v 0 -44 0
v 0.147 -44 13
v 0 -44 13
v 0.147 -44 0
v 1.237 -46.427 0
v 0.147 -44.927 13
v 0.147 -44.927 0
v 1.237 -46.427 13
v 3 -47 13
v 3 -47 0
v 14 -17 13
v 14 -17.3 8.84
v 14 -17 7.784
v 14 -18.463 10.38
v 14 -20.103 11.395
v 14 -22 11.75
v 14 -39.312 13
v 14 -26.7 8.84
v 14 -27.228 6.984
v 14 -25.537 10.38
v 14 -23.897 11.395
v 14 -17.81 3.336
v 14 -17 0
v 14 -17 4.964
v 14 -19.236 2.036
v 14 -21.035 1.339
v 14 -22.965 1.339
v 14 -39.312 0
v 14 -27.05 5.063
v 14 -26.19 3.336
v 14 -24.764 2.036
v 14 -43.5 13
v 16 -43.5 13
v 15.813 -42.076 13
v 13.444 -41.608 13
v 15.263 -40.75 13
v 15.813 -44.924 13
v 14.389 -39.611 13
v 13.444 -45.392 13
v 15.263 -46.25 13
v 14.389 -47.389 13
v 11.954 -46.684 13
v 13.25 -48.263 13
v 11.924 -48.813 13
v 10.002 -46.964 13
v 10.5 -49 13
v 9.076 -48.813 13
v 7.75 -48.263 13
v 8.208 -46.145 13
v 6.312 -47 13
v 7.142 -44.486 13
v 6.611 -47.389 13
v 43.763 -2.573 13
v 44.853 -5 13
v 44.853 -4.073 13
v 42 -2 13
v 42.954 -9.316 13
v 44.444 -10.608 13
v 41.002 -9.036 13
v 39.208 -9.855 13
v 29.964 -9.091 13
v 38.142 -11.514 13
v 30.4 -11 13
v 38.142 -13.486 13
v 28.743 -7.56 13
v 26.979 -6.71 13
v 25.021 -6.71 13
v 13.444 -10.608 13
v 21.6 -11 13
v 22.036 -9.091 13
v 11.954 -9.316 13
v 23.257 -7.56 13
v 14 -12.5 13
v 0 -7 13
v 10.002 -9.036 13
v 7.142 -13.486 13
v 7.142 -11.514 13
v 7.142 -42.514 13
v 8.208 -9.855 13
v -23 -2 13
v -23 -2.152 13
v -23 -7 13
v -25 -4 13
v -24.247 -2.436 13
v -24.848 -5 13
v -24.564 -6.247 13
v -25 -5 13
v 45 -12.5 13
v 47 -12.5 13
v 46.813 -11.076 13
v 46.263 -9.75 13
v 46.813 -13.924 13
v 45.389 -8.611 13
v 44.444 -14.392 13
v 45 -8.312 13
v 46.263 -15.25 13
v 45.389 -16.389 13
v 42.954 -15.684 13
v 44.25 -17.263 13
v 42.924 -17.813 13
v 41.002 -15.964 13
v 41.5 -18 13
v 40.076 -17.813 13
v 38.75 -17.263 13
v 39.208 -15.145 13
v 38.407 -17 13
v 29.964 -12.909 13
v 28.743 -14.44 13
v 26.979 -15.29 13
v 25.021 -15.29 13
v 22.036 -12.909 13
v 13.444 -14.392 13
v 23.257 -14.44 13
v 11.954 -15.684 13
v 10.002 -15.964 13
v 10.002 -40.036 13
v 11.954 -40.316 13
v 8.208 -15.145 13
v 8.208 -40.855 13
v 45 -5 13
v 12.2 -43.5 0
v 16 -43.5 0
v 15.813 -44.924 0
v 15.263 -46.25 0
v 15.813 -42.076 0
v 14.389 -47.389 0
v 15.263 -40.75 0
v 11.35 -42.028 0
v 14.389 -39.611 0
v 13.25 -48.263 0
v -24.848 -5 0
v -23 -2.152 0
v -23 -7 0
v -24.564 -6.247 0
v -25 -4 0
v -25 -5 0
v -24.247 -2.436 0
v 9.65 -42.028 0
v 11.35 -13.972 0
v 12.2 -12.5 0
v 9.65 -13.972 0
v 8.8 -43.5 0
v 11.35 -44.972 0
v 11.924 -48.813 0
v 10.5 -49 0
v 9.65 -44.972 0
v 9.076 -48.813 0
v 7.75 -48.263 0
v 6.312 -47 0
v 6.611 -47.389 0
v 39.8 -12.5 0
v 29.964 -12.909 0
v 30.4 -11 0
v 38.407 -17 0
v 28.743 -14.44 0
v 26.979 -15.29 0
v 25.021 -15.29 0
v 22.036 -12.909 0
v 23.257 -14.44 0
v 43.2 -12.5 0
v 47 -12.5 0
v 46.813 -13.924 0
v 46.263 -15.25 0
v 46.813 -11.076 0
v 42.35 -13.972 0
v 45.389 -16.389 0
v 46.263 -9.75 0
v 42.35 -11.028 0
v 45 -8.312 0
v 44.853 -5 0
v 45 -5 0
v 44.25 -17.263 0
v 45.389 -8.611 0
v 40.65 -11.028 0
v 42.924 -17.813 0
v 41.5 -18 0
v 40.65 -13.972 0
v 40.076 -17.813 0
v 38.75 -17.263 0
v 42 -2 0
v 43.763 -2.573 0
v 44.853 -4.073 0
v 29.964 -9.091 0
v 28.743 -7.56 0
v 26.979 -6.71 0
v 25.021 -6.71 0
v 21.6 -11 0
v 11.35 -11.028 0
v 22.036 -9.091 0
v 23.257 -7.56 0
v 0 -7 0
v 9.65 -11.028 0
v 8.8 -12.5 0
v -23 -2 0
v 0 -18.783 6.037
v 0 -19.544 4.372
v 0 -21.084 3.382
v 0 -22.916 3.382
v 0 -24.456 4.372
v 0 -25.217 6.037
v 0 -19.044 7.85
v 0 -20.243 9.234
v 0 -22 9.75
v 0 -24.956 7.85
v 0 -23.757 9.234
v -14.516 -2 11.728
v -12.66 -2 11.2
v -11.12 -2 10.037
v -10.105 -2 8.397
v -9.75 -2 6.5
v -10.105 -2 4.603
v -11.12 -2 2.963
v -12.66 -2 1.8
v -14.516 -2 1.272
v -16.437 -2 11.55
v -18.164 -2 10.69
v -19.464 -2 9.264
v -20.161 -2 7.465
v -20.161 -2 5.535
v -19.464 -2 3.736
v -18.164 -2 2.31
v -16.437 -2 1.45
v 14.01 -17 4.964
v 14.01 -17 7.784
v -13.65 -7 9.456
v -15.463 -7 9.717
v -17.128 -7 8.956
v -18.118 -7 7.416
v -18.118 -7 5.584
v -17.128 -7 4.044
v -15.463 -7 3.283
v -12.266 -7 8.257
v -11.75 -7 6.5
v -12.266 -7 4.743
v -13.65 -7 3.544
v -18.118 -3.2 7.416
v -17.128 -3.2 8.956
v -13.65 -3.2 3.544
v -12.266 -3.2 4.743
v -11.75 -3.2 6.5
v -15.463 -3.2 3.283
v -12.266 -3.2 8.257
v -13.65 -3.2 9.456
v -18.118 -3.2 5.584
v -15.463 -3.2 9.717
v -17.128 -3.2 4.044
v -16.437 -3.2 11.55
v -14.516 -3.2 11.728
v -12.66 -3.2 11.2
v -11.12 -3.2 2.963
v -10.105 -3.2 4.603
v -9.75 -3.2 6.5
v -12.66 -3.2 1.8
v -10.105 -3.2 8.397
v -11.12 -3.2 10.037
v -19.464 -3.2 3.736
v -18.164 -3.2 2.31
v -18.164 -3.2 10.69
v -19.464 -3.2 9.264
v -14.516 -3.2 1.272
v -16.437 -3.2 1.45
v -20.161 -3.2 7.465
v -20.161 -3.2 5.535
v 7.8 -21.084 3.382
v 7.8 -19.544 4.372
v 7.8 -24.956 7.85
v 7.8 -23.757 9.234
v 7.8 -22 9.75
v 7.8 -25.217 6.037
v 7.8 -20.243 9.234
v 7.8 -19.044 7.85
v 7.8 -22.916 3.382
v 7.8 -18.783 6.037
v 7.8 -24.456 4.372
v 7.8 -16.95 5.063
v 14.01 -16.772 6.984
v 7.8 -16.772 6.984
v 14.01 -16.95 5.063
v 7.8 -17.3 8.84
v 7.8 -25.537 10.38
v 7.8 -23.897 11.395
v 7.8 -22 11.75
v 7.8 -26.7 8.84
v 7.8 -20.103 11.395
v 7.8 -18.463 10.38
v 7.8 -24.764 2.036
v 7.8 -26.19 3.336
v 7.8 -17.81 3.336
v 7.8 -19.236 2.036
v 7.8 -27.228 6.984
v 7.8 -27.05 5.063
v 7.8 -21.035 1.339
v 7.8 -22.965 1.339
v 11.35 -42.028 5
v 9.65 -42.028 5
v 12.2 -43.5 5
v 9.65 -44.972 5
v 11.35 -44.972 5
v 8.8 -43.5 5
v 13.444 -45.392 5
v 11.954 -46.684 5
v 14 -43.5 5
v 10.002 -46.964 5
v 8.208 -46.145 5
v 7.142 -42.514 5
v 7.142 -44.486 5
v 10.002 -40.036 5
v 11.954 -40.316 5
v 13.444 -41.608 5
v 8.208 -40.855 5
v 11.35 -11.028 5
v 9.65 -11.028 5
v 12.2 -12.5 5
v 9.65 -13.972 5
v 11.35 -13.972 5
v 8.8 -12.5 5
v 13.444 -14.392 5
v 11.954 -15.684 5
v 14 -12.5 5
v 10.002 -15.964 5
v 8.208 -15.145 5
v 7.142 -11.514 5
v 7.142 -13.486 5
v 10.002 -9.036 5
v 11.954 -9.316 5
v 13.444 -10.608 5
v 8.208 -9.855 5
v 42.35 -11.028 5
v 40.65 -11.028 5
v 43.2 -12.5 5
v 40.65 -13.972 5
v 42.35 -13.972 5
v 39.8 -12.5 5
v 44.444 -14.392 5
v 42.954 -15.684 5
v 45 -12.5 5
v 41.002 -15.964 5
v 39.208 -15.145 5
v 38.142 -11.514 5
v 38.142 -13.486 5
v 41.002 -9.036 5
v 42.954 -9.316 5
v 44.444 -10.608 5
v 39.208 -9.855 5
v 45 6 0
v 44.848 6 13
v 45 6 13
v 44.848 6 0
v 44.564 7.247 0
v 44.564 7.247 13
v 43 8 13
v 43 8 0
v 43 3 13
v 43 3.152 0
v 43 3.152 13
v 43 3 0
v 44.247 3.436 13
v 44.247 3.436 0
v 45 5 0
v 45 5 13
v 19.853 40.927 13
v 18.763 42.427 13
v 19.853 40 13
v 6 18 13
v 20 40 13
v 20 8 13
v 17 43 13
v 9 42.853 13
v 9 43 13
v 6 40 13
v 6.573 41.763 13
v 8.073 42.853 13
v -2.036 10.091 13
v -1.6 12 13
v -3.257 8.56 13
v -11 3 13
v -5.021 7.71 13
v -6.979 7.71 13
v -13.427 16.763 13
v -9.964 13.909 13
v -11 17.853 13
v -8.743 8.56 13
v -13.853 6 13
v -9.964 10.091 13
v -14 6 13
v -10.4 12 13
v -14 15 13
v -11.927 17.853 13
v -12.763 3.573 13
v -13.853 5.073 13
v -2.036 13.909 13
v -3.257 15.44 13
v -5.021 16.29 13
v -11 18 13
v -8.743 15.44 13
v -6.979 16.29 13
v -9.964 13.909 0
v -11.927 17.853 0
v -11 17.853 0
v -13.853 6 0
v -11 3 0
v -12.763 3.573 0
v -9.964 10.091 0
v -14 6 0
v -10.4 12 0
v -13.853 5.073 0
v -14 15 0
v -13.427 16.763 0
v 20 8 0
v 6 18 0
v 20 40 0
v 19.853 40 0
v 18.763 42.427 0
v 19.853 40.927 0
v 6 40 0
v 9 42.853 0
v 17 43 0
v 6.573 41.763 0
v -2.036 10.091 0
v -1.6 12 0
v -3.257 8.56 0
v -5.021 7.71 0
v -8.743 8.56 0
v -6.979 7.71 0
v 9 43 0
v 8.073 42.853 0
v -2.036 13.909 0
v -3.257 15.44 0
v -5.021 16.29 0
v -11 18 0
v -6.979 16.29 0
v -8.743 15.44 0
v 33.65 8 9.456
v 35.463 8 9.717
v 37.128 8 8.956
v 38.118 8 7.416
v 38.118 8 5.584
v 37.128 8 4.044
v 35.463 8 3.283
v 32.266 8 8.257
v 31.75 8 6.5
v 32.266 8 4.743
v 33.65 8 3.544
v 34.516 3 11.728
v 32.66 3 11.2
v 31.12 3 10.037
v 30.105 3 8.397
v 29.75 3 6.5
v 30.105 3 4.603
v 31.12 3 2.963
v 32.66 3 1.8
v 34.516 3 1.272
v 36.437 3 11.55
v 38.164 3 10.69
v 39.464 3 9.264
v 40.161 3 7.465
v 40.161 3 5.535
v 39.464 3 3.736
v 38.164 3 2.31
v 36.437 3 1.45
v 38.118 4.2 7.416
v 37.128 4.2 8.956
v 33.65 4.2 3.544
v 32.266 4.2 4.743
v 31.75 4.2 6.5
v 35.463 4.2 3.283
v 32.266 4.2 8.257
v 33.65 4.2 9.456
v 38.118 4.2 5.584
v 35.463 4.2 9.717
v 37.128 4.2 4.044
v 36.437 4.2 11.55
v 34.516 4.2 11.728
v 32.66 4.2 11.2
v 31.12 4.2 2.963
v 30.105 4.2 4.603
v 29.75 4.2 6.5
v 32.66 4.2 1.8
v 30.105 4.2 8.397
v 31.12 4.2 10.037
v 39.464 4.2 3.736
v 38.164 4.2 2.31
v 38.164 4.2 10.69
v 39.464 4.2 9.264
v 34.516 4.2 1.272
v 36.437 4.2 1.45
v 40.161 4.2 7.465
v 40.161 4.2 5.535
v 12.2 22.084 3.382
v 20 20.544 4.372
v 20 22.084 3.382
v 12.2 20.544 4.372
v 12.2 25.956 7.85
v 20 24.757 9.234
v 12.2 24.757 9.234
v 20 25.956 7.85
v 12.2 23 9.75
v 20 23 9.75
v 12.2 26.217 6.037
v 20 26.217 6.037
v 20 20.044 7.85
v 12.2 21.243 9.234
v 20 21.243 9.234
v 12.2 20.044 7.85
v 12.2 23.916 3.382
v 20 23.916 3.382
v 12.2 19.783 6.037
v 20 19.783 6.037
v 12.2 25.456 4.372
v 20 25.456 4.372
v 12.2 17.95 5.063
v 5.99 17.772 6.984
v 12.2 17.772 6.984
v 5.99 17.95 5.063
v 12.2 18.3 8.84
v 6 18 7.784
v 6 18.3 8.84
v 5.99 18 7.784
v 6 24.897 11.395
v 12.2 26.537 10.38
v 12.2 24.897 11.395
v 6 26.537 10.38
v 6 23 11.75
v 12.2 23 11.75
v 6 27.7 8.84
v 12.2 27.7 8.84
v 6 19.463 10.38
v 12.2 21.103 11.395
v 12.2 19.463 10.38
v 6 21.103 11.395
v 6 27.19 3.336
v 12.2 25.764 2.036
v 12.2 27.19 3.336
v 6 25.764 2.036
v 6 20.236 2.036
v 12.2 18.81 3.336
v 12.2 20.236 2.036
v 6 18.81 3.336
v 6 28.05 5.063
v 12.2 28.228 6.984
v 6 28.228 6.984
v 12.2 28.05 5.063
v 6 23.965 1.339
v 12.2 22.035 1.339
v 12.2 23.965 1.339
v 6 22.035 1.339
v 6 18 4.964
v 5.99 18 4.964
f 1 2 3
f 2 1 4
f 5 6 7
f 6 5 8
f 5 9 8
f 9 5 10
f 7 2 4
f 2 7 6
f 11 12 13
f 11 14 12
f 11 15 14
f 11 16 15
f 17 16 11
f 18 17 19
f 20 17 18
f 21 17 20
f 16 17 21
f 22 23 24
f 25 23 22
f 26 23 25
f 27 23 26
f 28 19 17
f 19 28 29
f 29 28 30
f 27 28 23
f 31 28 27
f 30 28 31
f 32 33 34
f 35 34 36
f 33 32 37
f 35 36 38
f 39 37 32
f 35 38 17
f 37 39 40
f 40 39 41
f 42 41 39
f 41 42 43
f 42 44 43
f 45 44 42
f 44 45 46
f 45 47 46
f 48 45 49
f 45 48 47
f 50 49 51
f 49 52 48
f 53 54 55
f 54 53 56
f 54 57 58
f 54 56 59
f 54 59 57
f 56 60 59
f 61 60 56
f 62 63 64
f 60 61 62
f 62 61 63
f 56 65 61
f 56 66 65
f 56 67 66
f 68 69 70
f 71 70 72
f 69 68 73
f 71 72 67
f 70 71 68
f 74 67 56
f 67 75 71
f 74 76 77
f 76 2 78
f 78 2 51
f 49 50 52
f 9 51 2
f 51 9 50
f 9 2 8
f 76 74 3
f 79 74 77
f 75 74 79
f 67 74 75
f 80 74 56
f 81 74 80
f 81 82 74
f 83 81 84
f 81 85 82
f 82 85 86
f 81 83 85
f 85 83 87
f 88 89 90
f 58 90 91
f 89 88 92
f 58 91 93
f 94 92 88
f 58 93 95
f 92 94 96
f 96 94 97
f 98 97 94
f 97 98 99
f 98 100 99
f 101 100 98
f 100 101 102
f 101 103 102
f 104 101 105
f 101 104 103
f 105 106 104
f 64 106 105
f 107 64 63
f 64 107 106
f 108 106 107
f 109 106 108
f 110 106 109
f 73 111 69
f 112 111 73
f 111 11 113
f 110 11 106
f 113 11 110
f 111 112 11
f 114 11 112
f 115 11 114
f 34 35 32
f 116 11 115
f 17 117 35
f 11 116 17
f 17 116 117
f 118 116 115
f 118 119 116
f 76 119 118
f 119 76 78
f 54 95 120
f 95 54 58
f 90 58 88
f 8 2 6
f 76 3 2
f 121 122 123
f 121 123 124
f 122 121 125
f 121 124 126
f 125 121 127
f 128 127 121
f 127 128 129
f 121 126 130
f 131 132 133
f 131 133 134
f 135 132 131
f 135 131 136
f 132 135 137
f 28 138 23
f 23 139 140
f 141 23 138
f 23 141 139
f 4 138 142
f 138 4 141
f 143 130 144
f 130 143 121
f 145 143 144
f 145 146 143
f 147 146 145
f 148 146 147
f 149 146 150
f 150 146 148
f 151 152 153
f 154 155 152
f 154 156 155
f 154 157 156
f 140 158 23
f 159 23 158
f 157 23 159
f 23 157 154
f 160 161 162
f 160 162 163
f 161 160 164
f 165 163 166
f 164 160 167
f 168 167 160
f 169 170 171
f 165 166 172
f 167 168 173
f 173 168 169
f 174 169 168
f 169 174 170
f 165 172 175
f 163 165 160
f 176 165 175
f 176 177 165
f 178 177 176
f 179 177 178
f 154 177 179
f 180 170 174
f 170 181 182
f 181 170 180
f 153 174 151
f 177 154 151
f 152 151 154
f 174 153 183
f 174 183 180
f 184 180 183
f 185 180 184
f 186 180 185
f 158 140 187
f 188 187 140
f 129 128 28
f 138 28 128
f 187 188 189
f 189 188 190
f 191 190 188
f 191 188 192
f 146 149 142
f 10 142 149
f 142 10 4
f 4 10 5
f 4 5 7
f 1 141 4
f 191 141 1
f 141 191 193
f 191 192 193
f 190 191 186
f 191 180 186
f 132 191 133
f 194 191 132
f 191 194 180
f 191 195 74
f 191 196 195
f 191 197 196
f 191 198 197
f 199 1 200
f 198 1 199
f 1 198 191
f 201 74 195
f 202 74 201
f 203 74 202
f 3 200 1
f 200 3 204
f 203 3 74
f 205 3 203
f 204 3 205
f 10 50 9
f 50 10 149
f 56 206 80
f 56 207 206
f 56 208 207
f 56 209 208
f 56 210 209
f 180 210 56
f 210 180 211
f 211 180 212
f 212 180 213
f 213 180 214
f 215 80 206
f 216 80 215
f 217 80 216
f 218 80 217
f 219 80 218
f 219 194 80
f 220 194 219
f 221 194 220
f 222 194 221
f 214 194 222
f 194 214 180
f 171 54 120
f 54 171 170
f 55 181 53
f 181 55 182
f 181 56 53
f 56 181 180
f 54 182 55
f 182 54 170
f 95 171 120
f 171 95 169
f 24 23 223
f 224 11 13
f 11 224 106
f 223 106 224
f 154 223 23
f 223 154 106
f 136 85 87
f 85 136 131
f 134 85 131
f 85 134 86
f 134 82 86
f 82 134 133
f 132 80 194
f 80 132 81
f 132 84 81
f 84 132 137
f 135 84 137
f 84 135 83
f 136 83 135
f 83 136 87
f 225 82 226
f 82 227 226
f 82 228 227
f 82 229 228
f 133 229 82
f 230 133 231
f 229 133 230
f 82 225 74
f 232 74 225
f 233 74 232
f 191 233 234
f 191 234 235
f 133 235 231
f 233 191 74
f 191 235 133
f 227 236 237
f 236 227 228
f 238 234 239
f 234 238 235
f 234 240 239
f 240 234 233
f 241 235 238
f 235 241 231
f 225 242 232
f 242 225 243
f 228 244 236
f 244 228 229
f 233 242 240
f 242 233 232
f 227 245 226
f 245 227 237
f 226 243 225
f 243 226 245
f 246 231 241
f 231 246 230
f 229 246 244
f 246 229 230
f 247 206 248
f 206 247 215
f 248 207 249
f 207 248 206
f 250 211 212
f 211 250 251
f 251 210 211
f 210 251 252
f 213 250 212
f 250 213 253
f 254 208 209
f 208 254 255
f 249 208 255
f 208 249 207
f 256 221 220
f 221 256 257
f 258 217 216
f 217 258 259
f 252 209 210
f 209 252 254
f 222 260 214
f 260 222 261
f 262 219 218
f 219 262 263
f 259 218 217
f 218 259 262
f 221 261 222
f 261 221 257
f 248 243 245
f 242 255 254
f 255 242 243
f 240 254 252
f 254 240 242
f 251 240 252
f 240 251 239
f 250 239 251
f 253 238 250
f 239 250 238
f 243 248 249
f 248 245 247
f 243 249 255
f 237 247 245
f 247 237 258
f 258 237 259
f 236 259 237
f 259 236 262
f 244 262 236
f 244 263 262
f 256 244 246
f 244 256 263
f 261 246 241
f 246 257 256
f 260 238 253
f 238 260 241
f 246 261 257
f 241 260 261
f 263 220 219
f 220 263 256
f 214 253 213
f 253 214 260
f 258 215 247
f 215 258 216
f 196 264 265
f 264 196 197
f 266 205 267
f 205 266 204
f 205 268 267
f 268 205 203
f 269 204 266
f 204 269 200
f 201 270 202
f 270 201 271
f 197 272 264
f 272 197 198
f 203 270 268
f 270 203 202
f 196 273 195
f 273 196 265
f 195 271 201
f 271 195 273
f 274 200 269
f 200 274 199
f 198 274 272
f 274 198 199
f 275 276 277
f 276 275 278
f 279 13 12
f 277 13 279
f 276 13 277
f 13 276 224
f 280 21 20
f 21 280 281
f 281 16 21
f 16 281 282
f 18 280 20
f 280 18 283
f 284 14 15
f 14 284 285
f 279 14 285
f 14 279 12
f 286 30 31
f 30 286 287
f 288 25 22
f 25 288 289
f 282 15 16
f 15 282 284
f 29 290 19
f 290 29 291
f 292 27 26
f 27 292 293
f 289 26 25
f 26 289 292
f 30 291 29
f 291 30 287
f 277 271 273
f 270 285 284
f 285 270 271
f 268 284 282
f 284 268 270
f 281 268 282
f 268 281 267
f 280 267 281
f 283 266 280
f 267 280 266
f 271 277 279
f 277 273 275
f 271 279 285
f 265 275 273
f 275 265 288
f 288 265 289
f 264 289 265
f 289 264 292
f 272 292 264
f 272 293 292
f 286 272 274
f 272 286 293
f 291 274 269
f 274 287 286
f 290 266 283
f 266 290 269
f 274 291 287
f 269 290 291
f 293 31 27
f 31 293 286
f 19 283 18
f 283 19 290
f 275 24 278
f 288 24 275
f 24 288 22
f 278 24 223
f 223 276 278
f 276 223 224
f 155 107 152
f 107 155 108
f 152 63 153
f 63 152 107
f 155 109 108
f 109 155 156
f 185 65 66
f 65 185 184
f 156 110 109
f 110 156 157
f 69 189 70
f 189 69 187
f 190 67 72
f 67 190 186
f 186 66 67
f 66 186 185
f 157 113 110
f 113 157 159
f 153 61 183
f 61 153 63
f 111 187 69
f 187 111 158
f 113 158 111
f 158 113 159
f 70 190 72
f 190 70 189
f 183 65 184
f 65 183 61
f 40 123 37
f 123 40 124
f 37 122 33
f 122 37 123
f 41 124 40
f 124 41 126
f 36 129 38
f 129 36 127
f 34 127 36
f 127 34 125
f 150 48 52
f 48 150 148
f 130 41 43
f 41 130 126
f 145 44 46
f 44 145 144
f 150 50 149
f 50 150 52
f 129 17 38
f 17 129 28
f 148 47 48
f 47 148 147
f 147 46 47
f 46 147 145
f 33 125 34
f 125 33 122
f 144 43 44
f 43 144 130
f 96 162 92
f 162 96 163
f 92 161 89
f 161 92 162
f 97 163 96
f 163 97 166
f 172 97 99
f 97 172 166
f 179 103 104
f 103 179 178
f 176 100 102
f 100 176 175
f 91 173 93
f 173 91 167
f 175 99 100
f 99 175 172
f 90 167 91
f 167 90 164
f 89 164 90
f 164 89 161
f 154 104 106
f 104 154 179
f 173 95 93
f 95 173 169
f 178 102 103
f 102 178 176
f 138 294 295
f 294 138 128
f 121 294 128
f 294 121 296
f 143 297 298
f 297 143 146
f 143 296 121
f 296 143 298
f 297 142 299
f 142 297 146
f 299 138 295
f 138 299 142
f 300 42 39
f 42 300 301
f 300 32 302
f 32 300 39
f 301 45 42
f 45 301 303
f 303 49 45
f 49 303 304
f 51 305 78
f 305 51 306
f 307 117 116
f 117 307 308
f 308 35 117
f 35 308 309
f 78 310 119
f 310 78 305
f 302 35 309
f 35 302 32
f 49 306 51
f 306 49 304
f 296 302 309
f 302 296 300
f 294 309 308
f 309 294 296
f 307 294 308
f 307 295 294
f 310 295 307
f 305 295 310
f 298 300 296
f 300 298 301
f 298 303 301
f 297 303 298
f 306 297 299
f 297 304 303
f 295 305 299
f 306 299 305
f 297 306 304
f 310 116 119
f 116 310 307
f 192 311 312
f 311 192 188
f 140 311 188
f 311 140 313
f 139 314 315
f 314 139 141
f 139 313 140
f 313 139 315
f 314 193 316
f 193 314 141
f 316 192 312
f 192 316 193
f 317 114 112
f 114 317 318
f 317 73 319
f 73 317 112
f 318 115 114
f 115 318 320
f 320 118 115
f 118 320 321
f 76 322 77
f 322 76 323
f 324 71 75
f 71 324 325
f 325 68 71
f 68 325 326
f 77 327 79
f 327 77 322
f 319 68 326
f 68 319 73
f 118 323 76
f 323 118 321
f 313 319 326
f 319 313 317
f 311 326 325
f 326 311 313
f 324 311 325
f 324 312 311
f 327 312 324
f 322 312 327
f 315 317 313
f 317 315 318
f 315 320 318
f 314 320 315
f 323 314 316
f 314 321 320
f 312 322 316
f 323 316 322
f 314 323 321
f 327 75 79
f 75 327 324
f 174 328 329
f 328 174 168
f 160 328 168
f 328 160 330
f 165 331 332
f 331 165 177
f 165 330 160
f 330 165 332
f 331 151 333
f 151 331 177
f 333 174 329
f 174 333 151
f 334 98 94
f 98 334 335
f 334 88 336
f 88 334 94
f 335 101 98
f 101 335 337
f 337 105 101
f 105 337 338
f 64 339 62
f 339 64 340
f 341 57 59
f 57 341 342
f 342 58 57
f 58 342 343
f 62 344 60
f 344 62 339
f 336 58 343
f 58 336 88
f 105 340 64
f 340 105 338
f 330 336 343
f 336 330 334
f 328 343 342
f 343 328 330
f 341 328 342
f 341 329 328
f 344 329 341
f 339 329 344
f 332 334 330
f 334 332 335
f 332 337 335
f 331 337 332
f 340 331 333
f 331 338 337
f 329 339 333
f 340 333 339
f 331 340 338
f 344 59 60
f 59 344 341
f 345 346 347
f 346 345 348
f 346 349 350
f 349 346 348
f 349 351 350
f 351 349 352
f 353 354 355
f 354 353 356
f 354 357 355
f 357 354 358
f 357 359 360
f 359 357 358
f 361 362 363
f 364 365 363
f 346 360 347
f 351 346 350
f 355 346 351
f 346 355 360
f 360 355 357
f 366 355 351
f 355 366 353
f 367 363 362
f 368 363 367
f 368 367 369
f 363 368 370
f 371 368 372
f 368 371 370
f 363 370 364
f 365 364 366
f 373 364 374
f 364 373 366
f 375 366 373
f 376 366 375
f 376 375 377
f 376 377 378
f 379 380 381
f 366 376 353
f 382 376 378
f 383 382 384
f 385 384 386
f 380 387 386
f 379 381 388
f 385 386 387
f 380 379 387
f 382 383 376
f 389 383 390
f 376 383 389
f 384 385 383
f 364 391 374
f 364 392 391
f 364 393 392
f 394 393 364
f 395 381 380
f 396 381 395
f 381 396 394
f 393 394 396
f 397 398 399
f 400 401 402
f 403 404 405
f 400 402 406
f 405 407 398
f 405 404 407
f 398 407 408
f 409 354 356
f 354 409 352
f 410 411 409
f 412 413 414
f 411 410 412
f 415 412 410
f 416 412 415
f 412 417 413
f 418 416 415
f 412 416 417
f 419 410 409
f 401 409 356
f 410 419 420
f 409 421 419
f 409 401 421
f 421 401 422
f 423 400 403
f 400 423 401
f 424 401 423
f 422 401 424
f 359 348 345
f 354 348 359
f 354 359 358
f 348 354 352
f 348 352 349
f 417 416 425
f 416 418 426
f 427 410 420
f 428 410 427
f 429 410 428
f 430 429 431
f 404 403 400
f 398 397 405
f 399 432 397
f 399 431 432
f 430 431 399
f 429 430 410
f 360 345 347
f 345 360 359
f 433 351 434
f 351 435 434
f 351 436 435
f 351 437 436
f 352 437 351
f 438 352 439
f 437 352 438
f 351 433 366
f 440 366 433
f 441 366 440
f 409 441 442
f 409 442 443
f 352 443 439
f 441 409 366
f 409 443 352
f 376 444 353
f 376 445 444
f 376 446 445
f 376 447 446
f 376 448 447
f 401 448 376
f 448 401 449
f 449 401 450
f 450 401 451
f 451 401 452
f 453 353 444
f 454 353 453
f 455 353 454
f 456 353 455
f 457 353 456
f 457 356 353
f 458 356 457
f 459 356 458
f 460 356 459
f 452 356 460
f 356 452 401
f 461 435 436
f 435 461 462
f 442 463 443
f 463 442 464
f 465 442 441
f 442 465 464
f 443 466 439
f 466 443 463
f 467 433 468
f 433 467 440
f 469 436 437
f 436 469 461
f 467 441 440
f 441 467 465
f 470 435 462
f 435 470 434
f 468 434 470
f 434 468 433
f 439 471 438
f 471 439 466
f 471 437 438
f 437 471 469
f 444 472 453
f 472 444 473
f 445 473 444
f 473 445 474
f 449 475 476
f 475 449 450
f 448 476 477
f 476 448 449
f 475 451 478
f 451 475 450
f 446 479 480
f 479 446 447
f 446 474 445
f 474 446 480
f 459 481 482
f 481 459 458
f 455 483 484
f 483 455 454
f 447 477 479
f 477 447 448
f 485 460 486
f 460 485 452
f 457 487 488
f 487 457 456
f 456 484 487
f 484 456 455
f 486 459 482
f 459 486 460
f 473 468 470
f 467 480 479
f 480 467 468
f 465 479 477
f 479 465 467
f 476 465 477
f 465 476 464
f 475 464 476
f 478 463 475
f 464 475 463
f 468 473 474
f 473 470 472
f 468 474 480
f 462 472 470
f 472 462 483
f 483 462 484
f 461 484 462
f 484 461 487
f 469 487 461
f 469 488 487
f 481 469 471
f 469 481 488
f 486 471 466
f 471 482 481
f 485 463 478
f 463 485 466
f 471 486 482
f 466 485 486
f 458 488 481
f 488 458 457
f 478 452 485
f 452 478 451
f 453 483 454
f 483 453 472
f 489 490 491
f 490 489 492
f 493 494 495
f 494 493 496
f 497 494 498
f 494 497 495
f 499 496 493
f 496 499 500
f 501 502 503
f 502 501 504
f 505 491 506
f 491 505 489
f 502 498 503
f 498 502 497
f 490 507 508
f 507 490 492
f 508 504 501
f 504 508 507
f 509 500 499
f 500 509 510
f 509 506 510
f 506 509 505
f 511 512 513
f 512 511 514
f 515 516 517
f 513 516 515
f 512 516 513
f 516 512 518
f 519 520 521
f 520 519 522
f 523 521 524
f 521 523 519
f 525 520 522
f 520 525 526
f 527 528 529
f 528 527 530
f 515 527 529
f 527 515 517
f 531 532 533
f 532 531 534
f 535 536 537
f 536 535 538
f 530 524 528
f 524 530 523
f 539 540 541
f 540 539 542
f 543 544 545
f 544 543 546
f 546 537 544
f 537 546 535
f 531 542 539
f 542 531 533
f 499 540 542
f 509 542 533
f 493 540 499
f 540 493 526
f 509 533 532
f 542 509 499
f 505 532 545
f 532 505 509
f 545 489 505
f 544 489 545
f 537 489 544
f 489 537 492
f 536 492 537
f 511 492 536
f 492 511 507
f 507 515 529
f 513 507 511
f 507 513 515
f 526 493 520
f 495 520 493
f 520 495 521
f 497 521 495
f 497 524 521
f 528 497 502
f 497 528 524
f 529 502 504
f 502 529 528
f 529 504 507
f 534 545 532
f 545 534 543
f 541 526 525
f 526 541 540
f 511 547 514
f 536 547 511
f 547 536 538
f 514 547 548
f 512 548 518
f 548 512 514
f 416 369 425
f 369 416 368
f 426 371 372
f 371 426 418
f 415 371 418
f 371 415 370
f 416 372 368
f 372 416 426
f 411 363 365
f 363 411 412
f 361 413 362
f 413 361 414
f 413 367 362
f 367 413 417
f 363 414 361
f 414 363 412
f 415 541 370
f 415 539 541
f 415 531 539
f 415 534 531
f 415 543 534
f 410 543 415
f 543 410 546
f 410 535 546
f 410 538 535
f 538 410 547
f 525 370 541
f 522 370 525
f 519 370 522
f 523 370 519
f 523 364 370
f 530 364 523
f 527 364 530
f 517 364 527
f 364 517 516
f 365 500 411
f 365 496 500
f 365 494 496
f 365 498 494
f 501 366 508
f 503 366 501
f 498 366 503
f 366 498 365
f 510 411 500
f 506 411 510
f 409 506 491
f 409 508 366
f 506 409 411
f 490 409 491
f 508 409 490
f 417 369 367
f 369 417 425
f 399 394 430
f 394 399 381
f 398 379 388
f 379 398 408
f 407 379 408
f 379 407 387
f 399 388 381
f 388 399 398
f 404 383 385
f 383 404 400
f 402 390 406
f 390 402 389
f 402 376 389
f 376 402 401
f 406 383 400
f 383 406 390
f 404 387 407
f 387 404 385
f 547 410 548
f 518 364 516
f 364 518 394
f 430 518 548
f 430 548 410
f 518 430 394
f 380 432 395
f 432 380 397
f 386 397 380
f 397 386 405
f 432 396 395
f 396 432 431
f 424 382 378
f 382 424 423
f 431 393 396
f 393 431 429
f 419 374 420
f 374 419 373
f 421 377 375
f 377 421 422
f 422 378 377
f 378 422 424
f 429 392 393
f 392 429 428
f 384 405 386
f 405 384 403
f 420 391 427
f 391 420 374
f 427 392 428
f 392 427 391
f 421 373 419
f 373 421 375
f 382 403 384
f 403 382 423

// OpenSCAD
// file: inc/functions.scad
// PRUSA iteration3
// Functions used in many files
// GNU GPL v3
// Josef Průša <josefprusa@me.com>
// Václav 'ax' Hůla <axtheb@gmail.com>
// Vlnofka <>
// http://www.reprap.org/wiki/Prusa_Mendel
// http://github.com/prusajr/PrusaMendel

module roundcorner(diameter){
	difference(){
		cube(size = [diameter,diameter,99], center = false);
		translate(v = [diameter, diameter, 0]) cylinder(h = 100, r=diameter, center=true);
	}
}
module nut(d,h,horizontal=true){
    cornerdiameter =  (d / 2) / cos (180 / 6);
    cylinder(h = h, r = cornerdiameter, $fn = 6);
    if(horizontal){
        for(i = [1:6]){
            rotate([0,0,60*i]) translate([-cornerdiameter-0.2,0,0]) rotate([0,0,-45]) cube([2,2,h]);
        }
    }
}

// Based on nophead research
module polyhole(d, h, center=false) {
    n = max(round(2 * d),3);
    rotate([0,0,180])
        cylinder(h = h, r = (d / 2) / cos (180 / n), $fn = n);
}

// make it interchangeable between this and cylinder
module cylinder_poly(r, h, center=false){
    polyhole(d=r*2, h=h, center=center);
}

module fillet(radius, height=100, $fn=0) {
    //this creates acutal fillet
    translate([-radius, -radius, -height/2-0.01])
        difference() {
            cube([radius*2, radius*2, height+0.02]);
            cylinder(r=radius, h=height+0.02, $fn=$fn);
        }
}

module cube_fillet(size, radius=-1, vertical=[3,3,3,3], top=[0,0,0,0], bottom=[0,0,0,0], center=false, $fn=0){
    //
    if (center) {
        cube_fillet_inside(size, radius, vertical, top, bottom, $fn);
    } else {
        translate([size[0]/2, size[1]/2, size[2]/2])
            cube_fillet_inside(size, radius, vertical, top, bottom, $fn);
    }
}

module cube_negative_fillet(size, radius=-1, vertical=[3,3,3,3], top=[0,0,0,0], bottom=[0,0,0,0], $fn=0){

    j=[1,0,1,0];

    for (i=[0:3]) {
        if (radius > -1) {
            rotate([0, 0, 90*i]) translate([size[1-j[i]]/2, size[j[i]]/2, 0]) fillet(radius, size[2], $fn=$fn);
        } else {
            rotate([0, 0, 90*i]) translate([size[1-j[i]]/2, size[j[i]]/2, 0]) fillet(vertical[i], size[2], $fn=$fn);
        }
        rotate([90*i, -90, 0]) translate([size[2]/2, size[j[i]]/2, 0 ]) fillet(top[i], size[1-j[i]], $fn=$fn);
        rotate([90*(4-i), 90, 0]) translate([size[2]/2, size[j[i]]/2, 0]) fillet(bottom[i], size[1-j[i]], $fn=$fn);

    }
}

module cube_fillet_inside(size, radius=-1, vertical=[3,3,3,3], top=[0,0,0,0], bottom=[0,0,0,0], $fn=0){
    //makes CENTERED cube with round corners
    // if you give it radius, it will fillet vertical corners.
    //othervise use vertical, top, bottom arrays
    //when viewed from top, it starts in upper right corner (+x,+y quadrant) , goes counterclockwise
    //top/bottom fillet starts in direction of Y axis and goes CCW too


    if (radius == 0) {
        cube(size, center=true);
    } else {
        difference() {
            cube(size, center=true);
            cube_negative_fillet(size, radius, vertical, top, bottom, $fn);
        }
    }
}


module nema17(places=[1,1,1,1], size=15.5, h=10, holes=false, shadow=false, $fn=24){
    for (i=[0:3]) {
        if (places[i] == 1) {
            rotate([0, 0, 90*i]) translate([size, size, 0]) {
                if (holes) {
                    #rotate([0, 0, -90*i])  translate([0,0,-10]) screw(r=1.7, slant=false, head_drop=13, $fn=$fn, h=h+12);
                } else {
                    rotate([0, 0, -90*i]) cylinder(h=h, r=5.5, $fn=$fn);
                }
            }
        }
    }
    if (shadow != false) {
        %translate ([0, 0, shadow+21+3]) cube([42,42,42], center = true);
    //flange
        %translate ([0, 0, shadow+21+3-21-1]) cylinder(r=11,h=2, center = true, $fn=20);
    //shaft
        %translate ([0, 0, shadow+21+3-21-7]) cylinder(r=2.5,h=14, center = true);
    }
}

module screw(h=20, r=2, r_head=3.5, head_drop=0, slant=true, poly=false, $fn=0){
    //makes screw with head
    //for substraction as screw hole
    if (poly) {
        cylinder_poly(h=h, r=r, $fn=$fn);
    } else {
        cylinder(h=h, r=r, $fn=$fn);
    }
    if (slant) {
        translate([0, 0, head_drop-0.01]) cylinder(h=r_head, r2=0, r1=r_head, $fn=$fn);
    }

    if (head_drop > 0) {
        translate([0, 0, -0.01]) cylinder(h=head_drop+0.01, r=r_head, $fn=$fn);
    }
}
module screw_cylinder(r_head=5.25,r=3.25,head_drop=6.2,slant=false){
	screw(r_head=r_head,head_drop=head_drop,r=r, slant=slant);

}

//screw_cylinder();
//cube_fillet([10,20,30], vertical=[3,2,0,0], top=[3,2,0,5], bottom=[3,2,0,5]);
//cube_fillet([10,20,30], radius=2, top=[7,2,7,2]);
// file: inc/metric.scad
// PRUSA iteration3
// Default metric sizes
// GNU GPL v3
// Josef Průša <josefprusa@me.com>
// http://www.reprap.org/wiki/Prusa_Mendel
// http://github.com/prusajr/PrusaMendel

// DONT CHANGE THIS FILE! ALTER VALUES IN CONFIGURATION.SCAD INSTEAD

// RODS

threaded_rod_diameter = 8.7;
threaded_rod_diameter_horizontal = 8.7;
smooth_bar_diameter = 8;
smooth_bar_diameter_horizontal = 8.8;

// Nuts and bolts

m8_diameter = 9;
m8_nut_diameter = 14.1;

m4_diameter = 4.5;
m4_nut_diameter = 9;

m3_diameter = 3.6;
m3_nut_diameter = 5.3;
m3_nut_diameter_horizontal = 6.1;

// Bushing holder

bushing_core_diameter = smooth_bar_diameter;
bushing_material_thickness = 1;

// Motors

motor_shaft = 5.5;
// file: configuration.scad
// PRUSA iteration3
// Configuration file
// GNU GPL v3
// Josef Průša <josefprusa@me.com>
// Václav 'ax' Hůla <axtheb@gmail.com>
// http://www.reprap.org/wiki/Prusa_Mendel
// http://github.com/prusajr/PrusaMendel

// PLEASE SELECT ONE OF THE CONFIGURATIONS BELOW
// BY UN-COMMENTING IT

// Uncomment for metric settings
// METRIC METRIC METRIC METRIC METRIC METRIC METRIC METRIC 

include <inc/metric.scad>;

// Custom settings here, tailor to your supplies and print settings

// Select your belt type ******************************************************

//T2.5
//belt_tooth_distance = 2.5;
//belt_tooth_ratio = 0.5;

//T5 (strongly discouraged)
belt_tooth_distance = 5;
belt_tooth_ratio = 0.75;

//HTD3
//belt_tooth_distance = 3;
//belt_tooth_ratio = 0.75;

//MXL
//belt_tooth_distance = 2.032;
//belt_tooth_ratio = 0.64;

// Choose bearing/bushing configuration ***************************************

//Choose from:

// 0 = Z as lm[e]8uu, X and Y bushings
// 1 = all bushings
// 2 = all bearings [default. Do not change unless you really know what you are doing]
// DO NOT OFFER 0 or 1 VARIANTS FOR SALE. We really mean that. In the long run it hurts everyone.

bearing_choice = 2;

// Bushing version
// 0 = square igus housings. By igus we mean JFM-0810-10 or GFM-0810-10
// 1 = round igus (works better if printed precisely)
// 2 = bronze self-aligning bushings
bushing_type = 0;

//Bearing version
// 0 = default lm8uu
// 1 = lme8uu
bearing_type = 0;

// Select idler bearing size **************************************************

// 0 = 608 [standard skate bearings]
// 1 = 624 [roughly same diameter as pulley, makes belt parallel so its prettier]

idler_bearing = 0;

// Thickness of the XZ plate board
board_thickness = 12;

//Layer height * width over thickness. Used for idler sleeve
single_wall_width = 0.3*2.2;

// END of custom settings


// You are not supposed to change this
board_to_xz_distance = 26;
xaxis_rod_distance = 45;
carriage_l = 74;
carriage_hole_to_side = 5;
carriage_hole_height = 4;

//calculated from settings

idler_size = (idler_bearing == 0) ? 22 : 13;

//use 4.5 for 608, 2.5 for 624
idler_size_inner_r = (idler_bearing == 0) ? 4.5 : 2.5;

idler_width = (idler_bearing == 0) ? 9 : 5;

// CHANGE ONLY THE STUFF YOU KNOW
// IT WILL REPLACE DEFAULT SETTING

// RODS

// threaded_rod_diameter = 0;
// threaded_rod_diameter_horizontal = 0;
// smooth_bar_diameter = 0;
// smooth_bar_diameter_horizontal = 0;

// Nuts and bolts

// m8_diameter = 0;
// m8_nut_diameter = 0;

// m4_diameter = 0;
// m4_nut_diameter = 0;

// m3_diameter = 0;
// m3_nut_diameter = 0;

// Bushing holder

// bushing_core_diameter = smooth_bar_diameter;
// bushing_material_thickness = 0;

///counted stuff
m3_nut_diameter_bigger = ((m3_nut_diameter  / 2) / cos (180 / 6))*2;

// functions
include <inc/functions.scad>


// These constants define the geometry of the complete-printer.scad

//x_smooth_rod_length=325;
//y_smooth_rod_length=405;
//z_smooth_rod_length=235;
bed_x_size=225;
bed_y_size=225;

x_smooth_rod_length=450+board_thickness*2+10; // 492 for 16mm thickness; 484 for 12mm thickness
y_smooth_rod_length=470;
z_smooth_rod_length=405;  
bed_x_size=225;
bed_y_size=225;
// main file
// PRUSA iteration3
// Z axis
// GNU GPL v3
// Josef Průša <josefprusa@me.com>
// Václav 'ax' Hůla <axtheb@gmail.com>
// http://www.reprap.org/wiki/Prusa_Mendel
// http://github.com/prusajr/PrusaMendel

include <configuration.scad>


module zmotorholder(thickness=13){
    difference(){
        union(){
            // Motor holding part
            difference(){
                union(){
                    zrodholder(thickness=thickness, xlen=45, ylen=45);
                    translate([board_to_xz_distance, board_to_xz_distance, 0]) {
                        nema17(places=[0,1,1,1], h=thickness);
                    }
                }

                // motor screw holes
                translate([board_to_xz_distance, board_to_xz_distance, thickness]) {
                    mirror([0,0,1]) translate([0,0,thickness-8])
                        nema17(places=[0,1,1,1], holes=true, h=thickness, shadow=5);
                }
            }
        }
translate([14, 20, thickness/2]) rotate([0, -90, 0]) screw_cylinder();
    }
}


module zrodholder(thickness=13, ylen=40, xlen=34){
    difference(){
        union(){
            // Rod holding part
            difference(){
                union(){
                    //piece along the flat side of a board
                    cube_fillet([14, ylen, thickness]);
                    //hole for Z axis is thru this
                    cube_fillet([xlen, 15, thickness]);
                    //piece along cut side of the board
                    translate([-25,0,0]) cube_fillet([30, 5, thickness], radius=2);
                }
                //smooth rod hole
                translate([board_to_xz_distance,5+(smooth_bar_diameter/2),-1]) cylinder(h=board_thickness+2, r=(smooth_bar_diameter_horizontal/2));
                
                //side screw
                translate([-15, -5, 6.5]) rotate([-90, 0, 0]) screw_cylinder();
                //front screw
                
                translate([14, 20, thickness/2]) rotate([0, -90, 0]) screw_cylinder();
            }
        }
//color("red")cube([100,100,14],center=true);
    }
}

translate([0, -2, 0]) mirror([0,1,0]) zmotorholder();
//translate([0,2,0]) zmotorholder();

//translate([21,-59,0]) zrodholder();
translate([20,3,0]) rotate([0,0,180]) mirror([0,1,0]) zrodholder();
